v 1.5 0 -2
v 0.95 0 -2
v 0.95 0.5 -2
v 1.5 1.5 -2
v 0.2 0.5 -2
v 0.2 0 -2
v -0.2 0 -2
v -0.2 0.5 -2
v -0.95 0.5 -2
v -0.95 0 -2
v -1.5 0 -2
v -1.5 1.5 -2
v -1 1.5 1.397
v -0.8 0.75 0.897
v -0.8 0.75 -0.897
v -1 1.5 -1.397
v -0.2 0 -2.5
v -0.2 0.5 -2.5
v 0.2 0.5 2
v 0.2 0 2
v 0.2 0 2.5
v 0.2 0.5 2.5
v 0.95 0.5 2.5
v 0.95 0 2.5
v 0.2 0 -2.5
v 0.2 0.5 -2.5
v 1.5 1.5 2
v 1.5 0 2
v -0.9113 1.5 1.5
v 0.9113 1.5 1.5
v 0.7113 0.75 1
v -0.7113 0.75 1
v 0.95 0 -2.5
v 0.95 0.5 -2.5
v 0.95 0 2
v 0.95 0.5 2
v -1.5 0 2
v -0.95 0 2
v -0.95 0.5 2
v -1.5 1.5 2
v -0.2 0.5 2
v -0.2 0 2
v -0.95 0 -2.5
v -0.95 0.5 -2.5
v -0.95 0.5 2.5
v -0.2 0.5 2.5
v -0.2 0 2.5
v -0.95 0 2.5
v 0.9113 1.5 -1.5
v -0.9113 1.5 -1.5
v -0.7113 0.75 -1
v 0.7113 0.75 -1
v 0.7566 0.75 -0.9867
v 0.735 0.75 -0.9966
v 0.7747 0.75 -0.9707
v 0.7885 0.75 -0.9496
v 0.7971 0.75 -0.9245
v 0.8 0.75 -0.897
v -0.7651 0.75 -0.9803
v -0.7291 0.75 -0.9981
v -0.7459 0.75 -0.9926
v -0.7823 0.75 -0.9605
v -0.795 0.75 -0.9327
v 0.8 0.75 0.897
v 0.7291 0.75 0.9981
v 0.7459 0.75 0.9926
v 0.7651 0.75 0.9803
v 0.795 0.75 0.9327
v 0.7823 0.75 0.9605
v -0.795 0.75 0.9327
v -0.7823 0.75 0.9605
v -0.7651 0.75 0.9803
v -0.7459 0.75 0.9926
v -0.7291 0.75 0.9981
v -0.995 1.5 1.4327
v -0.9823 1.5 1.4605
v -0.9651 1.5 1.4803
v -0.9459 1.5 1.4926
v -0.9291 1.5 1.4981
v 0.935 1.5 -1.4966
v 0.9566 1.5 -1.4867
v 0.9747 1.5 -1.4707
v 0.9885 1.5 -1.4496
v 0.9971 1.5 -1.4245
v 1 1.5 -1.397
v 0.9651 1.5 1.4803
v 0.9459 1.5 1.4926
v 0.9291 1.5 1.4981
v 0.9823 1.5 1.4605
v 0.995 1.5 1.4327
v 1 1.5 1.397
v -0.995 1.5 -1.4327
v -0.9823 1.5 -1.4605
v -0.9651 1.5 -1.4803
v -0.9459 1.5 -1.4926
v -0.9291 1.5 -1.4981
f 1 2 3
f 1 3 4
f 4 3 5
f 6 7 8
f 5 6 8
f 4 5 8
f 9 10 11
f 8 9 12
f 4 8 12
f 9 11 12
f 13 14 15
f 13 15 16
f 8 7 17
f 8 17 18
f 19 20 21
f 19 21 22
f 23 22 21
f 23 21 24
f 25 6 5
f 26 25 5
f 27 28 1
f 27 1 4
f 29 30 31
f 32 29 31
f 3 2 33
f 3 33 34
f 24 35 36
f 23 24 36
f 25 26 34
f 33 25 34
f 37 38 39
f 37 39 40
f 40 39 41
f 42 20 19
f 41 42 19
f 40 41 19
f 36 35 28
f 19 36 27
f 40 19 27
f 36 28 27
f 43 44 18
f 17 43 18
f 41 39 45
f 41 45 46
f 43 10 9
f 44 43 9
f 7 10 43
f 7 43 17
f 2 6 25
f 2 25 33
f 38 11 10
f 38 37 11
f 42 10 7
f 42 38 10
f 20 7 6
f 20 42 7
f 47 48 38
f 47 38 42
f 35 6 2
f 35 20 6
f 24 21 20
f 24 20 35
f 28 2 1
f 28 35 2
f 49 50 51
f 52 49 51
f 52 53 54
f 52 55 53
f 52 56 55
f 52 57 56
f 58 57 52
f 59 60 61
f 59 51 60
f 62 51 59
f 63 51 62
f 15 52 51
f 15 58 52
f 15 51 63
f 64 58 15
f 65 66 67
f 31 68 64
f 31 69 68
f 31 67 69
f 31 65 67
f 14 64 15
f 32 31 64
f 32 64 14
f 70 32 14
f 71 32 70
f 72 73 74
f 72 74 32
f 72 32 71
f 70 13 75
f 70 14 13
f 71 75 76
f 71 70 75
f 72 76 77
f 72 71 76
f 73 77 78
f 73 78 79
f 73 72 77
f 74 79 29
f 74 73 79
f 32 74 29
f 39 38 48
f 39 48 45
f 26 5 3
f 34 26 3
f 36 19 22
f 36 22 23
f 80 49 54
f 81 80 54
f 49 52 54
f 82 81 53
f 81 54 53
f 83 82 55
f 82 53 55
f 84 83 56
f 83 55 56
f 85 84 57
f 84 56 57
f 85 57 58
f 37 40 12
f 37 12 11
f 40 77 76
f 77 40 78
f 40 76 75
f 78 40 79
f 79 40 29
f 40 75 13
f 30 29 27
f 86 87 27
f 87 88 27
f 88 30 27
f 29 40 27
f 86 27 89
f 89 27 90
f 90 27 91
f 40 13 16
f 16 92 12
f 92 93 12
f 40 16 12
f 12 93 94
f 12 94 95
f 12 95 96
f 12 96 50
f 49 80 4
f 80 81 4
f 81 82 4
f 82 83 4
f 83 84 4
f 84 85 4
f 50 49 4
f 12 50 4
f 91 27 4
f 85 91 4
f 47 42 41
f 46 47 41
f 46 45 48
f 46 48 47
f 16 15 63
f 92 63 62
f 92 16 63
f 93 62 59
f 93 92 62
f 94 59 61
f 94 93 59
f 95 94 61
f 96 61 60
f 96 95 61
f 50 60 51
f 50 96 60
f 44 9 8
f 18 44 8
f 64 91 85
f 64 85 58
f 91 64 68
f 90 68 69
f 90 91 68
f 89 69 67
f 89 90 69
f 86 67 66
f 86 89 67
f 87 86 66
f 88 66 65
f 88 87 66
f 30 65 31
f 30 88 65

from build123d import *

# Parameters (mm, degrees)
SALIENTE_EXTRUIR1_DEPTH = 1.5
SALIENTE_EXTRUIR2_DEPTH = 1.5
REDONDEO2_R             = 0.1
CROQUIS3_W              = 0.75
CROQUIS3_H              = 0.5
SALIENTE_EXTRUIR3_DEPTH = 0.5


with BuildPart() as part:
    # Croquis1 → Saliente-Extruir1 (new, symmetric)
    with BuildSketch(Plane.XY):
        Polygon((-1.5, 0), (1.5, 0), (1.5, 1.5), (1, 1.5), (0.8, 0.75), (-0.8, 0.75), (-1, 1.5), (-1.5, 1.5), align=None)
    extrude(amount=SALIENTE_EXTRUIR1_DEPTH, both=True)

    # Croquis2 → Saliente-Extruir2 (add, symmetric)
    with BuildSketch(Plane(origin=(0, 0, 0), x_dir=(0, 0, -1), z_dir=(1, 0, 0))):
        Polygon((1, 0), (2, 0), (2, 1.5), (1.5, 1.5), (1, 0.75), align=None)
        Polygon((-1, 0.75), (-1, 0), (-2, 0), (-2, 1.5), (-1.5, 1.5), align=None)
    extrude(amount=SALIENTE_EXTRUIR2_DEPTH, both=True)

    # Redondeo2
    redondeo2_edges = [part.edges().sort_by_distance(p)[0] for p in [
        (0.9, 1.125, -1.25),
        (-0.9, 1.125, -1.25),
        (0.9, 1.125, 1.25),
        (-0.9, 1.125, 1.25),
    ]]
    fillet(redondeo2_edges, radius=REDONDEO2_R)

    # Croquis3 → Saliente-Extruir3 (add)
    with BuildSketch(Plane.XY.offset(2)):
        with Locations((-0.575, 0.25)):
            Rectangle(CROQUIS3_W, CROQUIS3_H)
        with Locations((0.575, 0.25)):
            Rectangle(CROQUIS3_W, CROQUIS3_H)
    saliente_extruir3 = extrude(amount=SALIENTE_EXTRUIR3_DEPTH)

    # Simetría1: Saliente-Extruir3 across plane
    add(saliente_extruir3.mirror(Plane.XY))


solid = part.part
